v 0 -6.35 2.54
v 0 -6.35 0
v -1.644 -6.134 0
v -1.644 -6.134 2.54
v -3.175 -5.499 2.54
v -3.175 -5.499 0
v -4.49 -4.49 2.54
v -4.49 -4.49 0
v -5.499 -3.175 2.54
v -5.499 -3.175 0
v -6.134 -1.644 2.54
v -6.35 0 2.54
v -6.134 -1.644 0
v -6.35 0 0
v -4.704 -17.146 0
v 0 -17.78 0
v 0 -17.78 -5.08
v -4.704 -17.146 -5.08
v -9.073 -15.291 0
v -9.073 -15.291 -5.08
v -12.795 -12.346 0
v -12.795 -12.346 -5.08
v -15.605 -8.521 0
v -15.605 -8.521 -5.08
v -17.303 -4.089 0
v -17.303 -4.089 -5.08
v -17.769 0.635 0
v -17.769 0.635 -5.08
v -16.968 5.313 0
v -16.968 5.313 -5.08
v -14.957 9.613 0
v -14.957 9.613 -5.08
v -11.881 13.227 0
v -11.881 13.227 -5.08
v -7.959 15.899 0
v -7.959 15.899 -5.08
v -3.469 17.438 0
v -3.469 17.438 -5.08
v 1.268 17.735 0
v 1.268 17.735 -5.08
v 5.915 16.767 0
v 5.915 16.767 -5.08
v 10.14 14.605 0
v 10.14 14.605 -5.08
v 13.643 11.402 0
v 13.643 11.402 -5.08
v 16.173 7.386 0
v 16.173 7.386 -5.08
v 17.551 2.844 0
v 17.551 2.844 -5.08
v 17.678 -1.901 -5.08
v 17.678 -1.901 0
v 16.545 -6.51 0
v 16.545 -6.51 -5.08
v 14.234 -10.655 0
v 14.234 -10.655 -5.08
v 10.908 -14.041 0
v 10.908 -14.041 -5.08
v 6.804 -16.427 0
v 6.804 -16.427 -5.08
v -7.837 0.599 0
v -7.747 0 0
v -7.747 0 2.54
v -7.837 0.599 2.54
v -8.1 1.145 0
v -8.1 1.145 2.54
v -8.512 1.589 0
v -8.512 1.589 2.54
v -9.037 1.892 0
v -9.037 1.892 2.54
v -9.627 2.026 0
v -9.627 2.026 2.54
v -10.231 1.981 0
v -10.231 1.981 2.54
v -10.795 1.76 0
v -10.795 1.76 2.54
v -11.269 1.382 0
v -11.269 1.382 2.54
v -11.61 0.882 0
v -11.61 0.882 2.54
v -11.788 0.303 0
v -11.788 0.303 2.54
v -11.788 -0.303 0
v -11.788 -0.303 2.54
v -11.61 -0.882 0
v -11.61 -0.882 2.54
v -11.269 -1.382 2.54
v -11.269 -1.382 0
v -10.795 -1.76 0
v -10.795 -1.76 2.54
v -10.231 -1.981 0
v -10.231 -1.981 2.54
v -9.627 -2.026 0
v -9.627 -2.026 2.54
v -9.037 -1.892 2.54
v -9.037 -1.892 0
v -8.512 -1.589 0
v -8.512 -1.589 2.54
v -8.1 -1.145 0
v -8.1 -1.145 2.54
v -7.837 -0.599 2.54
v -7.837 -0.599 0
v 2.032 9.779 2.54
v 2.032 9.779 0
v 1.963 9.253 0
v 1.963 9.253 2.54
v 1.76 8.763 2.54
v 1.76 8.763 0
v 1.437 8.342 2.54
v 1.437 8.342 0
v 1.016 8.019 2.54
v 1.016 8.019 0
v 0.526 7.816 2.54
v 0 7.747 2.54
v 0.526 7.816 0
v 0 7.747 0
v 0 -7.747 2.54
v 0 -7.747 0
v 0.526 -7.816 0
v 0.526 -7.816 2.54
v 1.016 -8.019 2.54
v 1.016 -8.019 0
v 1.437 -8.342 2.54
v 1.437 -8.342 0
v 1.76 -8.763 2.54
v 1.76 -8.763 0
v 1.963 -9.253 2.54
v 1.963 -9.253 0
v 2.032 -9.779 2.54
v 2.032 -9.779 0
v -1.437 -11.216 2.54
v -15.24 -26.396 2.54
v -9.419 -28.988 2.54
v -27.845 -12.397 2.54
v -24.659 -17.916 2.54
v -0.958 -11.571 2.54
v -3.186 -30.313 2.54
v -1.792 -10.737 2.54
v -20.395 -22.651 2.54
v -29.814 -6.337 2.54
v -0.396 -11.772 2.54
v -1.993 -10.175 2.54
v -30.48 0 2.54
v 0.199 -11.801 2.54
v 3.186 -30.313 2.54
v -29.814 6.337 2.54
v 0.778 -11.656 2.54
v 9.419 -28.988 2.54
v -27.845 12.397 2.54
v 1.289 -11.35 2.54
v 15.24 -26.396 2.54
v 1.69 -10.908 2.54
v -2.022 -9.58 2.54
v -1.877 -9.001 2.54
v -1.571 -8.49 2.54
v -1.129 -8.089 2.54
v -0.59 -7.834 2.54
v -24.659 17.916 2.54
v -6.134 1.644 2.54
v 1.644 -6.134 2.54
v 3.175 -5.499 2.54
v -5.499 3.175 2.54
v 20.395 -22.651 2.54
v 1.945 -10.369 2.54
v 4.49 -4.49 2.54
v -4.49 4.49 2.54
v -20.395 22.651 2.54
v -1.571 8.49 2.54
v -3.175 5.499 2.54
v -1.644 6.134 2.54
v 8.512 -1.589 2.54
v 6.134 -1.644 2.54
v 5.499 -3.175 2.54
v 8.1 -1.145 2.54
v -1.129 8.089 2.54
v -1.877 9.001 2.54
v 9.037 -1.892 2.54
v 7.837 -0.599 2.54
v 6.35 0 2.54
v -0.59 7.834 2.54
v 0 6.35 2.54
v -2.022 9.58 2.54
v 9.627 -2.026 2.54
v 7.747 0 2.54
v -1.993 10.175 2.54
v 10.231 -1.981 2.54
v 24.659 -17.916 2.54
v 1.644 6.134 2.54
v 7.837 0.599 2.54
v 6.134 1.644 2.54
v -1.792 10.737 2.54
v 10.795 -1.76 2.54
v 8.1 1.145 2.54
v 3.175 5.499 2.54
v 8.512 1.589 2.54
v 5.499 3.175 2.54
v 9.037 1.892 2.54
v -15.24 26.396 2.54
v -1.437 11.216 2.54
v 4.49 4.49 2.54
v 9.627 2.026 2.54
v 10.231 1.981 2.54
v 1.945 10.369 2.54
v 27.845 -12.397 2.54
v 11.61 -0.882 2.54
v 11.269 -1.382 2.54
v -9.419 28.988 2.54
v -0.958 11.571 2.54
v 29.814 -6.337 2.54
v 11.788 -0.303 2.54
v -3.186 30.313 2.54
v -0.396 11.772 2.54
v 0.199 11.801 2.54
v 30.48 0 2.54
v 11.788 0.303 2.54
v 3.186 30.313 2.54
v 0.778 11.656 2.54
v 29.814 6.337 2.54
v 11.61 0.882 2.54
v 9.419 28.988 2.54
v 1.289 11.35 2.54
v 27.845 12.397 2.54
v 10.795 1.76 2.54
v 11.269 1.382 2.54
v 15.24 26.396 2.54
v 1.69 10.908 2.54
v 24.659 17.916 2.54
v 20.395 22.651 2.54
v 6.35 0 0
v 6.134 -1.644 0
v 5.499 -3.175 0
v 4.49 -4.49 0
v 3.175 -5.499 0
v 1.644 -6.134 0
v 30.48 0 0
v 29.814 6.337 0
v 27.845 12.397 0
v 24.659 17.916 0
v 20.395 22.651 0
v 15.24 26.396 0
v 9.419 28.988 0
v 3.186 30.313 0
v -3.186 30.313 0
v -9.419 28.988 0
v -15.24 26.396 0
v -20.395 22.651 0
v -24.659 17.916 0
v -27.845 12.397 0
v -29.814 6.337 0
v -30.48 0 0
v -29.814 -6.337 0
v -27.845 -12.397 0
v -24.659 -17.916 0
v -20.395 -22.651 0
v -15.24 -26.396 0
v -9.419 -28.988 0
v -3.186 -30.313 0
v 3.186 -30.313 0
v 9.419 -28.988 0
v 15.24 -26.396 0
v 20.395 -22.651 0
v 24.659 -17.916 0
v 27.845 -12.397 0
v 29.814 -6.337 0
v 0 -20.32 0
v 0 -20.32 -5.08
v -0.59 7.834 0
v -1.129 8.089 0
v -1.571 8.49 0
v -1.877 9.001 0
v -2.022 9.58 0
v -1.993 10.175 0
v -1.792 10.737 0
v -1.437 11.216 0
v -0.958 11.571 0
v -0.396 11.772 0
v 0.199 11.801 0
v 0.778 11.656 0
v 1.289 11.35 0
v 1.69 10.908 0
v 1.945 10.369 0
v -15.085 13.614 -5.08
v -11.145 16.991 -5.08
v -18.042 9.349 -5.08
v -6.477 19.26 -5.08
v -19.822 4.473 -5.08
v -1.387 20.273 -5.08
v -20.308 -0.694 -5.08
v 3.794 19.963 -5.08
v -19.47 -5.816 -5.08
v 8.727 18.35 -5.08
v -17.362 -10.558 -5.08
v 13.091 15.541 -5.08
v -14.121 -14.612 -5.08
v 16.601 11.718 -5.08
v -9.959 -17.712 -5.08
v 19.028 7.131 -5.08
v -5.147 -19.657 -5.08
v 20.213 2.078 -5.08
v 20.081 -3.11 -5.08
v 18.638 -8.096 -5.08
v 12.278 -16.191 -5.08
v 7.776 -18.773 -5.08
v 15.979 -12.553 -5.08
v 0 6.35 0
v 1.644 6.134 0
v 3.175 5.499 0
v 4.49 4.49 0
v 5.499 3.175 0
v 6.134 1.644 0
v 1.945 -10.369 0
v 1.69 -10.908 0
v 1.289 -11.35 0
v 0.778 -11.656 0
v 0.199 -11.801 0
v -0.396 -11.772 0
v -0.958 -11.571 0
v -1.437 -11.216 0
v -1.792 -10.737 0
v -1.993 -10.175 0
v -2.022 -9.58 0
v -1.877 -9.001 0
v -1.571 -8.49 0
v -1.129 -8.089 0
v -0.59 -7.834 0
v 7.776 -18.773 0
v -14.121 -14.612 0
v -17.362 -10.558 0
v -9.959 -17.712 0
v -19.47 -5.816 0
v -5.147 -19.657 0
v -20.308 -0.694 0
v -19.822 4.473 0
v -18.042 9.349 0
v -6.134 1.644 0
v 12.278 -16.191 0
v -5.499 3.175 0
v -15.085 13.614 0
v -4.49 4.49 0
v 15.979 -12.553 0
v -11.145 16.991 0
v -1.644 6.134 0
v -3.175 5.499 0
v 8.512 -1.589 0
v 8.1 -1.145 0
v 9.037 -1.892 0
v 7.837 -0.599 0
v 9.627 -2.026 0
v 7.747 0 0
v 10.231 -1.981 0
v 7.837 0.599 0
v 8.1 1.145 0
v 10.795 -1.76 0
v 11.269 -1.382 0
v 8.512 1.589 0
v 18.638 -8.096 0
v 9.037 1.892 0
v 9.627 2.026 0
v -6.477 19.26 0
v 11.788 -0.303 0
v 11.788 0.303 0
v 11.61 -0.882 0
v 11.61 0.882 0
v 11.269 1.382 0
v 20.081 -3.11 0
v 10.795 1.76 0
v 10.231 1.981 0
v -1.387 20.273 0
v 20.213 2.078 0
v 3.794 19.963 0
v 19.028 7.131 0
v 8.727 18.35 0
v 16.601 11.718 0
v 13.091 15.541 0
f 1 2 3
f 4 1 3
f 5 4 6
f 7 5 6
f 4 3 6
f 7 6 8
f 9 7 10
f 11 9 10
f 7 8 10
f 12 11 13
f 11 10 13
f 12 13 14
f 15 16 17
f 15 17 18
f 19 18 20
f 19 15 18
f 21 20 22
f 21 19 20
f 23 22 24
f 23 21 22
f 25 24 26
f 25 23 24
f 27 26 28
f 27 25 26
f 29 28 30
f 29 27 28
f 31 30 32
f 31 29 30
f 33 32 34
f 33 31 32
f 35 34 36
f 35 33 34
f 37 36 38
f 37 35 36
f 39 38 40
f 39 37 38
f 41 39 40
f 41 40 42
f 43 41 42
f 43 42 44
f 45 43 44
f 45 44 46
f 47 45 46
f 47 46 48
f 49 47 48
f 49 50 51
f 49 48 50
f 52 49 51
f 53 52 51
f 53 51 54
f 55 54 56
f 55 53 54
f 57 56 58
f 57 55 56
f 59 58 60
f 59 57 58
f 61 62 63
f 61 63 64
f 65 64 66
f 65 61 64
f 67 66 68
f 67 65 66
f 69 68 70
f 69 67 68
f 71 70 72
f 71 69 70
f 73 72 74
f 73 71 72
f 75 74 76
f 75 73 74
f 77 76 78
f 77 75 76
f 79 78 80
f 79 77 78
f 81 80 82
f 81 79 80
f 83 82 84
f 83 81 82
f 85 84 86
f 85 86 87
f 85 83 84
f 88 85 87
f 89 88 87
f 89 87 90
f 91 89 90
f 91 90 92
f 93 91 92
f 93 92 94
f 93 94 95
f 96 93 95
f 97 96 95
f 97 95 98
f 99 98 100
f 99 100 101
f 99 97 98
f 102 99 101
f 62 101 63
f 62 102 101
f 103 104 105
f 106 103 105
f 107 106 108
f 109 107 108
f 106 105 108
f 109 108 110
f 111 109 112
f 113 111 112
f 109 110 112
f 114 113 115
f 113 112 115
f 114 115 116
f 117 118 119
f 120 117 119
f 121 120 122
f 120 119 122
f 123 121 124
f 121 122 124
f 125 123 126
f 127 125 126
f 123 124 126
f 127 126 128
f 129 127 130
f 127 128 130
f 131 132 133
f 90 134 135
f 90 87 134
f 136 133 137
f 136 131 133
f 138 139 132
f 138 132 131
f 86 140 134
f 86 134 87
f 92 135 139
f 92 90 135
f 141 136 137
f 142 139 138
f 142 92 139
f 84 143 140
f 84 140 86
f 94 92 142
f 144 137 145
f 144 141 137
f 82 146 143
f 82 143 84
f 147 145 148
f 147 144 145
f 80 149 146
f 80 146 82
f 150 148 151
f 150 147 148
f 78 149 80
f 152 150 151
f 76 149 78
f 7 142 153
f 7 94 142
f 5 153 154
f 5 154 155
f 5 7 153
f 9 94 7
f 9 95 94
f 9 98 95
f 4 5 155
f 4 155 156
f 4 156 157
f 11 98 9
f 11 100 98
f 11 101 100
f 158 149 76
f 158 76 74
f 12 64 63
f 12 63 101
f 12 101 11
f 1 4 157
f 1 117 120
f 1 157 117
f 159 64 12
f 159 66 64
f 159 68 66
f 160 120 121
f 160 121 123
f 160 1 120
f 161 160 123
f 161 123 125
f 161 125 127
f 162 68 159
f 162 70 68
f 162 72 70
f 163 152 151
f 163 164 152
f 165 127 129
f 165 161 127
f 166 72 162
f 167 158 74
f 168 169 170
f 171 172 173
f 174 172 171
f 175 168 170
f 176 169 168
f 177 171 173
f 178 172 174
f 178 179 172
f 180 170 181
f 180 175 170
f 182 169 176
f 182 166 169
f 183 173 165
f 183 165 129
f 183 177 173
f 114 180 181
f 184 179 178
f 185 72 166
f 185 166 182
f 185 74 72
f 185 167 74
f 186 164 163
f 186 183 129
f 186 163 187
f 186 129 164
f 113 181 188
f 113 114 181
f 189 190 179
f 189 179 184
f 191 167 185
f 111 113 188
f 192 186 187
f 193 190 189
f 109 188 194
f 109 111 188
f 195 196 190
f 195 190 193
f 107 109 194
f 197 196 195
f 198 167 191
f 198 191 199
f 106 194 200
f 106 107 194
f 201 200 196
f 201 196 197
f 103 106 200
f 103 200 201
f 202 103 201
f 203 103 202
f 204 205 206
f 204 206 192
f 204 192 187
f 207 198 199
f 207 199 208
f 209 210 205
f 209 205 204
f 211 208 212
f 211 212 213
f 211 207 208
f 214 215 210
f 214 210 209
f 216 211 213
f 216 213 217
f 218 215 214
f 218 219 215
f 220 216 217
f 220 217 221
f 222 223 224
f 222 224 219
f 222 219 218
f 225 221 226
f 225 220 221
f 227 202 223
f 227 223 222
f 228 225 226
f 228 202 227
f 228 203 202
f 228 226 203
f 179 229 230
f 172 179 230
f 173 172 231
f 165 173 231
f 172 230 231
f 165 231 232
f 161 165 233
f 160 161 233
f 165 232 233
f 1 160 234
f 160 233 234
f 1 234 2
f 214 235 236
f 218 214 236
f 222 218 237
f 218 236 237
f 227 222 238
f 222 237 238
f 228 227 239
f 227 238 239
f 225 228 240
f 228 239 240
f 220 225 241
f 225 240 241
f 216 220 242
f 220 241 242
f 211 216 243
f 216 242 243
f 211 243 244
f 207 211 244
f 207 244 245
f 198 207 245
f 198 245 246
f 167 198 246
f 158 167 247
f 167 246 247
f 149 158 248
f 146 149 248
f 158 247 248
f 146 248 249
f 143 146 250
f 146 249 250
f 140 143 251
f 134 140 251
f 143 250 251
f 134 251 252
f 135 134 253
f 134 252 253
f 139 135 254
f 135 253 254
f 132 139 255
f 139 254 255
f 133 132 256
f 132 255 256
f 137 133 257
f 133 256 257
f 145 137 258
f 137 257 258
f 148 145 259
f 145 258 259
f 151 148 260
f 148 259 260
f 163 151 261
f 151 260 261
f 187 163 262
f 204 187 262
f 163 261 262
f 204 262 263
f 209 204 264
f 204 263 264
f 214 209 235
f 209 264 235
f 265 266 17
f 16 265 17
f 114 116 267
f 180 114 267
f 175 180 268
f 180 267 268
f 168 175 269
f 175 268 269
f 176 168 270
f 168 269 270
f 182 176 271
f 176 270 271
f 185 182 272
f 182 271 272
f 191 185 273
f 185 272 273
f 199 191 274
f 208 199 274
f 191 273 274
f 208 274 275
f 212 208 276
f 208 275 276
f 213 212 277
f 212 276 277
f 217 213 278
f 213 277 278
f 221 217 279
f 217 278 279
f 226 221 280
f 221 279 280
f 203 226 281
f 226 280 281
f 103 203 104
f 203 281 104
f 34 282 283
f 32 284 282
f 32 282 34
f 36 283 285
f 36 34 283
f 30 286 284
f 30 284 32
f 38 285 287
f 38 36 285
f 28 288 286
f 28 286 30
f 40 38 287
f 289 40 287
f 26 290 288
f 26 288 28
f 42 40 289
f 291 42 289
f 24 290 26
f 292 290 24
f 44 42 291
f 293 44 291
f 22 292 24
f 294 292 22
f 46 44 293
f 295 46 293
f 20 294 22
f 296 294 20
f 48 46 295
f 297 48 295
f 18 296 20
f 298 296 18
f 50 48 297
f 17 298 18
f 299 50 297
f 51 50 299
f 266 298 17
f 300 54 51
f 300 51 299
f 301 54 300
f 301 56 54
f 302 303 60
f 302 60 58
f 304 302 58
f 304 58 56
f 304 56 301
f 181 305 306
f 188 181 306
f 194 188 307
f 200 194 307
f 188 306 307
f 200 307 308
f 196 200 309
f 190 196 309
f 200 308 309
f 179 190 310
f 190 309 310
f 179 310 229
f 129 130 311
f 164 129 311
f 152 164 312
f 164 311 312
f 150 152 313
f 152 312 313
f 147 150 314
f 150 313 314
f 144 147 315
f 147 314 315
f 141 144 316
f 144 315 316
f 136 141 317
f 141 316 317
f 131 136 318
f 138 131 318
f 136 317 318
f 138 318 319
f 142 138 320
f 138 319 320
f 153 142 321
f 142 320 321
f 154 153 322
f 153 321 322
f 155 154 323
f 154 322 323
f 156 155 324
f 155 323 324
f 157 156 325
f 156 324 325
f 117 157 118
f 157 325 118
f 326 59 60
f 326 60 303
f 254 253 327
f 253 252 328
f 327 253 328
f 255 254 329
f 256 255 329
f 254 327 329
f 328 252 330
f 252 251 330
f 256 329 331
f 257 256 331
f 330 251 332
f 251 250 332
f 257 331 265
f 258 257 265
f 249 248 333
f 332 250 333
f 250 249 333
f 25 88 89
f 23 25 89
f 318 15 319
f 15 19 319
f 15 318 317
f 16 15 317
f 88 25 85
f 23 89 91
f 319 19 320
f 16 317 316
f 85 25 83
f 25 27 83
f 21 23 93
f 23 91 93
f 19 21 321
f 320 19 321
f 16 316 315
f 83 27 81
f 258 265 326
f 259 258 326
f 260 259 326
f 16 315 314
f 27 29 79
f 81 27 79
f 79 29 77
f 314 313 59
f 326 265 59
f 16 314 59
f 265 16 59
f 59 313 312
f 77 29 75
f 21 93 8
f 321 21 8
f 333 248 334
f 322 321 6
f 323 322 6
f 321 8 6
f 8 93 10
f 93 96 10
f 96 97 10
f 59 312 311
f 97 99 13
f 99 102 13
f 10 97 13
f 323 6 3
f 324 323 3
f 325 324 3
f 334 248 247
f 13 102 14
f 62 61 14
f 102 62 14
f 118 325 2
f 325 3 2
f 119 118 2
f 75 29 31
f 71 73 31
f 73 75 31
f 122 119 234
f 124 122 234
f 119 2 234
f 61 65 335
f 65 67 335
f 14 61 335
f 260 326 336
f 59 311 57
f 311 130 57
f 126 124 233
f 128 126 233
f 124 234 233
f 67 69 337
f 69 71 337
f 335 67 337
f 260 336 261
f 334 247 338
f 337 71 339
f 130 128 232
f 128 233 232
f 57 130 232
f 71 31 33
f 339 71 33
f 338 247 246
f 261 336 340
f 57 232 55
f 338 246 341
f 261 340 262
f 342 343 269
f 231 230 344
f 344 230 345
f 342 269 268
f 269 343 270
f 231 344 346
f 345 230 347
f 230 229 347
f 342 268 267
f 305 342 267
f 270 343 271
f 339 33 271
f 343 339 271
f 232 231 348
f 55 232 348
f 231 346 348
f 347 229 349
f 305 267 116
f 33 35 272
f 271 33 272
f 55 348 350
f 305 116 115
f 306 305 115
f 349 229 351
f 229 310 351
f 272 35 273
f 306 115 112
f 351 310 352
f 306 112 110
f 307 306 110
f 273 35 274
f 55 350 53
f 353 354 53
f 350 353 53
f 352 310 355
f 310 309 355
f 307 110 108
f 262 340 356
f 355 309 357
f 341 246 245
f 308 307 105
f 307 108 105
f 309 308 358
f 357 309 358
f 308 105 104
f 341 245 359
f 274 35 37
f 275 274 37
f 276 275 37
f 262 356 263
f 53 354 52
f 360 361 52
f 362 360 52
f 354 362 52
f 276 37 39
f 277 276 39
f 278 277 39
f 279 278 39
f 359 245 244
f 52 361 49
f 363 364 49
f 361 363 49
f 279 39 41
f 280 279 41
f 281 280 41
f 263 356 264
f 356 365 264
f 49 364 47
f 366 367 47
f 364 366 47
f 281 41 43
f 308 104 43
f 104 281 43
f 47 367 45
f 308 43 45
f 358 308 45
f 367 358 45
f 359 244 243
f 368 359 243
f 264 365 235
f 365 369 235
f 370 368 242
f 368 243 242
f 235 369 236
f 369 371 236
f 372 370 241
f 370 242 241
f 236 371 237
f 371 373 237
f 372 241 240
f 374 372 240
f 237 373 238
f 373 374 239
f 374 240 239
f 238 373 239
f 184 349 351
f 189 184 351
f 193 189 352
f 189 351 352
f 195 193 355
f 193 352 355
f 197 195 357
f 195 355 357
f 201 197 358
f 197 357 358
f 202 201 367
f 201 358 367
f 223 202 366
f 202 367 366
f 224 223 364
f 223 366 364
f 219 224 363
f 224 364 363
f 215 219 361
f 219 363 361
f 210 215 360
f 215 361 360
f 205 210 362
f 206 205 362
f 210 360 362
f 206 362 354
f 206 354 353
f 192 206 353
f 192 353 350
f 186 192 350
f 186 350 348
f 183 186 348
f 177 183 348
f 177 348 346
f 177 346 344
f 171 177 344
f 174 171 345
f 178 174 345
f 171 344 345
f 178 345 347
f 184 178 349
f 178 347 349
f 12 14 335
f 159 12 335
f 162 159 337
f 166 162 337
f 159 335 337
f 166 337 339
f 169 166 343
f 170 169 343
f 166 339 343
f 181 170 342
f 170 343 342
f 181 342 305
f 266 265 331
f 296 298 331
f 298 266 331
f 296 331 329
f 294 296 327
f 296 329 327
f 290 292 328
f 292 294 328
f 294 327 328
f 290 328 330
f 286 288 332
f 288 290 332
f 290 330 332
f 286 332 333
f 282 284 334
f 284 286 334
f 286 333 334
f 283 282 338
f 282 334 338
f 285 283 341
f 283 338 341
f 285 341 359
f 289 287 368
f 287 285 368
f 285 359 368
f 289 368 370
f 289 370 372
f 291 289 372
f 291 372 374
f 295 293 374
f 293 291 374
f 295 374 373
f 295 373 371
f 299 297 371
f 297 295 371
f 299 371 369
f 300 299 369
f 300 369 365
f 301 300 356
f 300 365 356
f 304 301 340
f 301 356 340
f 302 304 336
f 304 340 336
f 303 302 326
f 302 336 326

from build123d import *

# Parameters (mm, degrees)
F0_R     = 30.48
F0_R_2   = 2.921
F0_R_3   = 2.032
F1_DEPTH = 2.54
F2_R     = 20.32
F2_R_2   = 17.78
F3_DEPTH = 5.08
F5_DEPTH = 5.08


with BuildPart() as f1:
    # F0 (on Top) → F1 (new body)
    with BuildSketch(Plane.XY):
        Circle(F0_R)
        with BuildLine():
            ThreePointArc((2.921, -9.779), (-2.0654589078, -11.8444589078), (0, -6.858))
            ThreePointArc((0, -6.858), (2.0654589078, -7.7135410922), (2.921, -9.779))
        make_face(mode=Mode.SUBTRACT)
        with Locations((-9.779, 0)):
            Circle(F0_R_2, mode=Mode.SUBTRACT)
        with BuildLine():
            ThreePointArc((0, 6.35), (4.4901280605, 4.4901280605), (6.35, 0))
            ThreePointArc((6.35, 0), (4.4901280605, -4.4901280605), (0, -6.35))
            ThreePointArc((0, -6.35), (-4.4901280605, -4.4901280605), (-6.35, 0))
            ThreePointArc((-6.35, 0), (-4.4901280605, 4.4901280605), (0, 6.35))
        make_face(mode=Mode.SUBTRACT)
        with BuildLine():
            ThreePointArc((12.7, 0), (9.779, -2.921), (6.858, 0))
            ThreePointArc((6.858, 0), (9.779, 2.921), (12.7, 0))
        make_face(mode=Mode.SUBTRACT)
        with BuildLine():
            ThreePointArc((2.921, 9.779), (2.0654589078, 7.7135410922), (0, 6.858))
            ThreePointArc((0, 6.858), (-2.0654589078, 11.8444589078), (2.921, 9.779))
        make_face(mode=Mode.SUBTRACT)
        with BuildLine():
            ThreePointArc((2.921, 9.779), (-2.0654589078, 11.8444589078), (0, 6.858))
            ThreePointArc((0, 6.858), (2.0654589078, 7.7135410922), (2.921, 9.779))
        make_face()
        with BuildLine():
            ThreePointArc((2.032, 9.779), (1.4368409794, 8.3421590206), (0, 7.747))
            ThreePointArc((0, 7.747), (-1.4368409794, 11.2158409794), (2.032, 9.779))
        make_face(mode=Mode.SUBTRACT)
        with Locations((-9.779, 0)):
            Circle(F0_R_2)
        with Locations((-9.779, 0)):
            Circle(F0_R_3, mode=Mode.SUBTRACT)
        with BuildLine():
            ThreePointArc((2.921, -9.779), (2.0654589078, -7.7135410922), (0, -6.858))
            ThreePointArc((0, -6.858), (-2.0654589078, -11.8444589078), (2.921, -9.779))
        make_face()
        with BuildLine():
            ThreePointArc((2.032, -9.779), (-1.4368409794, -11.2158409794), (0, -7.747))
            ThreePointArc((0, -7.747), (1.4368409794, -8.3421590206), (2.032, -9.779))
        make_face(mode=Mode.SUBTRACT)
        with BuildLine():
            ThreePointArc((12.7, 0), (9.779, 2.921), (6.858, 0))
            ThreePointArc((6.858, 0), (9.779, -2.921), (12.7, 0))
        make_face()
        with BuildLine():
            ThreePointArc((11.811, 0), (9.779, -2.032), (7.747, 0))
            ThreePointArc((7.747, 0), (9.779, 2.032), (11.811, 0))
        make_face(mode=Mode.SUBTRACT)
    extrude(amount=F1_DEPTH)

    # F2 (on face) → F3 (join)
    with BuildSketch(Plane(origin=(0, 0, 0), x_dir=(1, 0, 0), z_dir=(0, 0, -1))):
        Circle(F2_R)
        Circle(F2_R_2, mode=Mode.SUBTRACT)
    extrude(amount=F3_DEPTH)

    # F4 (on face) → F5 (cut)
    with BuildSketch(Plane(origin=(0, 0, -5.08), x_dir=(1, 0, 0), z_dir=(0, 0, -1))):
        with BuildLine():
            Line((6.8041114275, 16.4265780881), (7.7761273457, 18.7732321006))
            ThreePointArc((7.7761273457, 18.7732321006), (3.9642353434, 19.9295568978), (0, 20.32))
            Line((0, 20.32), (0, 17.78))
            ThreePointArc((0, 17.78), (3.4687059254, 17.4383622856), (6.8041114275, 16.4265780881))
        make_face()
    extrude(amount=-F5_DEPTH, mode=Mode.SUBTRACT)


solid = f1.part
